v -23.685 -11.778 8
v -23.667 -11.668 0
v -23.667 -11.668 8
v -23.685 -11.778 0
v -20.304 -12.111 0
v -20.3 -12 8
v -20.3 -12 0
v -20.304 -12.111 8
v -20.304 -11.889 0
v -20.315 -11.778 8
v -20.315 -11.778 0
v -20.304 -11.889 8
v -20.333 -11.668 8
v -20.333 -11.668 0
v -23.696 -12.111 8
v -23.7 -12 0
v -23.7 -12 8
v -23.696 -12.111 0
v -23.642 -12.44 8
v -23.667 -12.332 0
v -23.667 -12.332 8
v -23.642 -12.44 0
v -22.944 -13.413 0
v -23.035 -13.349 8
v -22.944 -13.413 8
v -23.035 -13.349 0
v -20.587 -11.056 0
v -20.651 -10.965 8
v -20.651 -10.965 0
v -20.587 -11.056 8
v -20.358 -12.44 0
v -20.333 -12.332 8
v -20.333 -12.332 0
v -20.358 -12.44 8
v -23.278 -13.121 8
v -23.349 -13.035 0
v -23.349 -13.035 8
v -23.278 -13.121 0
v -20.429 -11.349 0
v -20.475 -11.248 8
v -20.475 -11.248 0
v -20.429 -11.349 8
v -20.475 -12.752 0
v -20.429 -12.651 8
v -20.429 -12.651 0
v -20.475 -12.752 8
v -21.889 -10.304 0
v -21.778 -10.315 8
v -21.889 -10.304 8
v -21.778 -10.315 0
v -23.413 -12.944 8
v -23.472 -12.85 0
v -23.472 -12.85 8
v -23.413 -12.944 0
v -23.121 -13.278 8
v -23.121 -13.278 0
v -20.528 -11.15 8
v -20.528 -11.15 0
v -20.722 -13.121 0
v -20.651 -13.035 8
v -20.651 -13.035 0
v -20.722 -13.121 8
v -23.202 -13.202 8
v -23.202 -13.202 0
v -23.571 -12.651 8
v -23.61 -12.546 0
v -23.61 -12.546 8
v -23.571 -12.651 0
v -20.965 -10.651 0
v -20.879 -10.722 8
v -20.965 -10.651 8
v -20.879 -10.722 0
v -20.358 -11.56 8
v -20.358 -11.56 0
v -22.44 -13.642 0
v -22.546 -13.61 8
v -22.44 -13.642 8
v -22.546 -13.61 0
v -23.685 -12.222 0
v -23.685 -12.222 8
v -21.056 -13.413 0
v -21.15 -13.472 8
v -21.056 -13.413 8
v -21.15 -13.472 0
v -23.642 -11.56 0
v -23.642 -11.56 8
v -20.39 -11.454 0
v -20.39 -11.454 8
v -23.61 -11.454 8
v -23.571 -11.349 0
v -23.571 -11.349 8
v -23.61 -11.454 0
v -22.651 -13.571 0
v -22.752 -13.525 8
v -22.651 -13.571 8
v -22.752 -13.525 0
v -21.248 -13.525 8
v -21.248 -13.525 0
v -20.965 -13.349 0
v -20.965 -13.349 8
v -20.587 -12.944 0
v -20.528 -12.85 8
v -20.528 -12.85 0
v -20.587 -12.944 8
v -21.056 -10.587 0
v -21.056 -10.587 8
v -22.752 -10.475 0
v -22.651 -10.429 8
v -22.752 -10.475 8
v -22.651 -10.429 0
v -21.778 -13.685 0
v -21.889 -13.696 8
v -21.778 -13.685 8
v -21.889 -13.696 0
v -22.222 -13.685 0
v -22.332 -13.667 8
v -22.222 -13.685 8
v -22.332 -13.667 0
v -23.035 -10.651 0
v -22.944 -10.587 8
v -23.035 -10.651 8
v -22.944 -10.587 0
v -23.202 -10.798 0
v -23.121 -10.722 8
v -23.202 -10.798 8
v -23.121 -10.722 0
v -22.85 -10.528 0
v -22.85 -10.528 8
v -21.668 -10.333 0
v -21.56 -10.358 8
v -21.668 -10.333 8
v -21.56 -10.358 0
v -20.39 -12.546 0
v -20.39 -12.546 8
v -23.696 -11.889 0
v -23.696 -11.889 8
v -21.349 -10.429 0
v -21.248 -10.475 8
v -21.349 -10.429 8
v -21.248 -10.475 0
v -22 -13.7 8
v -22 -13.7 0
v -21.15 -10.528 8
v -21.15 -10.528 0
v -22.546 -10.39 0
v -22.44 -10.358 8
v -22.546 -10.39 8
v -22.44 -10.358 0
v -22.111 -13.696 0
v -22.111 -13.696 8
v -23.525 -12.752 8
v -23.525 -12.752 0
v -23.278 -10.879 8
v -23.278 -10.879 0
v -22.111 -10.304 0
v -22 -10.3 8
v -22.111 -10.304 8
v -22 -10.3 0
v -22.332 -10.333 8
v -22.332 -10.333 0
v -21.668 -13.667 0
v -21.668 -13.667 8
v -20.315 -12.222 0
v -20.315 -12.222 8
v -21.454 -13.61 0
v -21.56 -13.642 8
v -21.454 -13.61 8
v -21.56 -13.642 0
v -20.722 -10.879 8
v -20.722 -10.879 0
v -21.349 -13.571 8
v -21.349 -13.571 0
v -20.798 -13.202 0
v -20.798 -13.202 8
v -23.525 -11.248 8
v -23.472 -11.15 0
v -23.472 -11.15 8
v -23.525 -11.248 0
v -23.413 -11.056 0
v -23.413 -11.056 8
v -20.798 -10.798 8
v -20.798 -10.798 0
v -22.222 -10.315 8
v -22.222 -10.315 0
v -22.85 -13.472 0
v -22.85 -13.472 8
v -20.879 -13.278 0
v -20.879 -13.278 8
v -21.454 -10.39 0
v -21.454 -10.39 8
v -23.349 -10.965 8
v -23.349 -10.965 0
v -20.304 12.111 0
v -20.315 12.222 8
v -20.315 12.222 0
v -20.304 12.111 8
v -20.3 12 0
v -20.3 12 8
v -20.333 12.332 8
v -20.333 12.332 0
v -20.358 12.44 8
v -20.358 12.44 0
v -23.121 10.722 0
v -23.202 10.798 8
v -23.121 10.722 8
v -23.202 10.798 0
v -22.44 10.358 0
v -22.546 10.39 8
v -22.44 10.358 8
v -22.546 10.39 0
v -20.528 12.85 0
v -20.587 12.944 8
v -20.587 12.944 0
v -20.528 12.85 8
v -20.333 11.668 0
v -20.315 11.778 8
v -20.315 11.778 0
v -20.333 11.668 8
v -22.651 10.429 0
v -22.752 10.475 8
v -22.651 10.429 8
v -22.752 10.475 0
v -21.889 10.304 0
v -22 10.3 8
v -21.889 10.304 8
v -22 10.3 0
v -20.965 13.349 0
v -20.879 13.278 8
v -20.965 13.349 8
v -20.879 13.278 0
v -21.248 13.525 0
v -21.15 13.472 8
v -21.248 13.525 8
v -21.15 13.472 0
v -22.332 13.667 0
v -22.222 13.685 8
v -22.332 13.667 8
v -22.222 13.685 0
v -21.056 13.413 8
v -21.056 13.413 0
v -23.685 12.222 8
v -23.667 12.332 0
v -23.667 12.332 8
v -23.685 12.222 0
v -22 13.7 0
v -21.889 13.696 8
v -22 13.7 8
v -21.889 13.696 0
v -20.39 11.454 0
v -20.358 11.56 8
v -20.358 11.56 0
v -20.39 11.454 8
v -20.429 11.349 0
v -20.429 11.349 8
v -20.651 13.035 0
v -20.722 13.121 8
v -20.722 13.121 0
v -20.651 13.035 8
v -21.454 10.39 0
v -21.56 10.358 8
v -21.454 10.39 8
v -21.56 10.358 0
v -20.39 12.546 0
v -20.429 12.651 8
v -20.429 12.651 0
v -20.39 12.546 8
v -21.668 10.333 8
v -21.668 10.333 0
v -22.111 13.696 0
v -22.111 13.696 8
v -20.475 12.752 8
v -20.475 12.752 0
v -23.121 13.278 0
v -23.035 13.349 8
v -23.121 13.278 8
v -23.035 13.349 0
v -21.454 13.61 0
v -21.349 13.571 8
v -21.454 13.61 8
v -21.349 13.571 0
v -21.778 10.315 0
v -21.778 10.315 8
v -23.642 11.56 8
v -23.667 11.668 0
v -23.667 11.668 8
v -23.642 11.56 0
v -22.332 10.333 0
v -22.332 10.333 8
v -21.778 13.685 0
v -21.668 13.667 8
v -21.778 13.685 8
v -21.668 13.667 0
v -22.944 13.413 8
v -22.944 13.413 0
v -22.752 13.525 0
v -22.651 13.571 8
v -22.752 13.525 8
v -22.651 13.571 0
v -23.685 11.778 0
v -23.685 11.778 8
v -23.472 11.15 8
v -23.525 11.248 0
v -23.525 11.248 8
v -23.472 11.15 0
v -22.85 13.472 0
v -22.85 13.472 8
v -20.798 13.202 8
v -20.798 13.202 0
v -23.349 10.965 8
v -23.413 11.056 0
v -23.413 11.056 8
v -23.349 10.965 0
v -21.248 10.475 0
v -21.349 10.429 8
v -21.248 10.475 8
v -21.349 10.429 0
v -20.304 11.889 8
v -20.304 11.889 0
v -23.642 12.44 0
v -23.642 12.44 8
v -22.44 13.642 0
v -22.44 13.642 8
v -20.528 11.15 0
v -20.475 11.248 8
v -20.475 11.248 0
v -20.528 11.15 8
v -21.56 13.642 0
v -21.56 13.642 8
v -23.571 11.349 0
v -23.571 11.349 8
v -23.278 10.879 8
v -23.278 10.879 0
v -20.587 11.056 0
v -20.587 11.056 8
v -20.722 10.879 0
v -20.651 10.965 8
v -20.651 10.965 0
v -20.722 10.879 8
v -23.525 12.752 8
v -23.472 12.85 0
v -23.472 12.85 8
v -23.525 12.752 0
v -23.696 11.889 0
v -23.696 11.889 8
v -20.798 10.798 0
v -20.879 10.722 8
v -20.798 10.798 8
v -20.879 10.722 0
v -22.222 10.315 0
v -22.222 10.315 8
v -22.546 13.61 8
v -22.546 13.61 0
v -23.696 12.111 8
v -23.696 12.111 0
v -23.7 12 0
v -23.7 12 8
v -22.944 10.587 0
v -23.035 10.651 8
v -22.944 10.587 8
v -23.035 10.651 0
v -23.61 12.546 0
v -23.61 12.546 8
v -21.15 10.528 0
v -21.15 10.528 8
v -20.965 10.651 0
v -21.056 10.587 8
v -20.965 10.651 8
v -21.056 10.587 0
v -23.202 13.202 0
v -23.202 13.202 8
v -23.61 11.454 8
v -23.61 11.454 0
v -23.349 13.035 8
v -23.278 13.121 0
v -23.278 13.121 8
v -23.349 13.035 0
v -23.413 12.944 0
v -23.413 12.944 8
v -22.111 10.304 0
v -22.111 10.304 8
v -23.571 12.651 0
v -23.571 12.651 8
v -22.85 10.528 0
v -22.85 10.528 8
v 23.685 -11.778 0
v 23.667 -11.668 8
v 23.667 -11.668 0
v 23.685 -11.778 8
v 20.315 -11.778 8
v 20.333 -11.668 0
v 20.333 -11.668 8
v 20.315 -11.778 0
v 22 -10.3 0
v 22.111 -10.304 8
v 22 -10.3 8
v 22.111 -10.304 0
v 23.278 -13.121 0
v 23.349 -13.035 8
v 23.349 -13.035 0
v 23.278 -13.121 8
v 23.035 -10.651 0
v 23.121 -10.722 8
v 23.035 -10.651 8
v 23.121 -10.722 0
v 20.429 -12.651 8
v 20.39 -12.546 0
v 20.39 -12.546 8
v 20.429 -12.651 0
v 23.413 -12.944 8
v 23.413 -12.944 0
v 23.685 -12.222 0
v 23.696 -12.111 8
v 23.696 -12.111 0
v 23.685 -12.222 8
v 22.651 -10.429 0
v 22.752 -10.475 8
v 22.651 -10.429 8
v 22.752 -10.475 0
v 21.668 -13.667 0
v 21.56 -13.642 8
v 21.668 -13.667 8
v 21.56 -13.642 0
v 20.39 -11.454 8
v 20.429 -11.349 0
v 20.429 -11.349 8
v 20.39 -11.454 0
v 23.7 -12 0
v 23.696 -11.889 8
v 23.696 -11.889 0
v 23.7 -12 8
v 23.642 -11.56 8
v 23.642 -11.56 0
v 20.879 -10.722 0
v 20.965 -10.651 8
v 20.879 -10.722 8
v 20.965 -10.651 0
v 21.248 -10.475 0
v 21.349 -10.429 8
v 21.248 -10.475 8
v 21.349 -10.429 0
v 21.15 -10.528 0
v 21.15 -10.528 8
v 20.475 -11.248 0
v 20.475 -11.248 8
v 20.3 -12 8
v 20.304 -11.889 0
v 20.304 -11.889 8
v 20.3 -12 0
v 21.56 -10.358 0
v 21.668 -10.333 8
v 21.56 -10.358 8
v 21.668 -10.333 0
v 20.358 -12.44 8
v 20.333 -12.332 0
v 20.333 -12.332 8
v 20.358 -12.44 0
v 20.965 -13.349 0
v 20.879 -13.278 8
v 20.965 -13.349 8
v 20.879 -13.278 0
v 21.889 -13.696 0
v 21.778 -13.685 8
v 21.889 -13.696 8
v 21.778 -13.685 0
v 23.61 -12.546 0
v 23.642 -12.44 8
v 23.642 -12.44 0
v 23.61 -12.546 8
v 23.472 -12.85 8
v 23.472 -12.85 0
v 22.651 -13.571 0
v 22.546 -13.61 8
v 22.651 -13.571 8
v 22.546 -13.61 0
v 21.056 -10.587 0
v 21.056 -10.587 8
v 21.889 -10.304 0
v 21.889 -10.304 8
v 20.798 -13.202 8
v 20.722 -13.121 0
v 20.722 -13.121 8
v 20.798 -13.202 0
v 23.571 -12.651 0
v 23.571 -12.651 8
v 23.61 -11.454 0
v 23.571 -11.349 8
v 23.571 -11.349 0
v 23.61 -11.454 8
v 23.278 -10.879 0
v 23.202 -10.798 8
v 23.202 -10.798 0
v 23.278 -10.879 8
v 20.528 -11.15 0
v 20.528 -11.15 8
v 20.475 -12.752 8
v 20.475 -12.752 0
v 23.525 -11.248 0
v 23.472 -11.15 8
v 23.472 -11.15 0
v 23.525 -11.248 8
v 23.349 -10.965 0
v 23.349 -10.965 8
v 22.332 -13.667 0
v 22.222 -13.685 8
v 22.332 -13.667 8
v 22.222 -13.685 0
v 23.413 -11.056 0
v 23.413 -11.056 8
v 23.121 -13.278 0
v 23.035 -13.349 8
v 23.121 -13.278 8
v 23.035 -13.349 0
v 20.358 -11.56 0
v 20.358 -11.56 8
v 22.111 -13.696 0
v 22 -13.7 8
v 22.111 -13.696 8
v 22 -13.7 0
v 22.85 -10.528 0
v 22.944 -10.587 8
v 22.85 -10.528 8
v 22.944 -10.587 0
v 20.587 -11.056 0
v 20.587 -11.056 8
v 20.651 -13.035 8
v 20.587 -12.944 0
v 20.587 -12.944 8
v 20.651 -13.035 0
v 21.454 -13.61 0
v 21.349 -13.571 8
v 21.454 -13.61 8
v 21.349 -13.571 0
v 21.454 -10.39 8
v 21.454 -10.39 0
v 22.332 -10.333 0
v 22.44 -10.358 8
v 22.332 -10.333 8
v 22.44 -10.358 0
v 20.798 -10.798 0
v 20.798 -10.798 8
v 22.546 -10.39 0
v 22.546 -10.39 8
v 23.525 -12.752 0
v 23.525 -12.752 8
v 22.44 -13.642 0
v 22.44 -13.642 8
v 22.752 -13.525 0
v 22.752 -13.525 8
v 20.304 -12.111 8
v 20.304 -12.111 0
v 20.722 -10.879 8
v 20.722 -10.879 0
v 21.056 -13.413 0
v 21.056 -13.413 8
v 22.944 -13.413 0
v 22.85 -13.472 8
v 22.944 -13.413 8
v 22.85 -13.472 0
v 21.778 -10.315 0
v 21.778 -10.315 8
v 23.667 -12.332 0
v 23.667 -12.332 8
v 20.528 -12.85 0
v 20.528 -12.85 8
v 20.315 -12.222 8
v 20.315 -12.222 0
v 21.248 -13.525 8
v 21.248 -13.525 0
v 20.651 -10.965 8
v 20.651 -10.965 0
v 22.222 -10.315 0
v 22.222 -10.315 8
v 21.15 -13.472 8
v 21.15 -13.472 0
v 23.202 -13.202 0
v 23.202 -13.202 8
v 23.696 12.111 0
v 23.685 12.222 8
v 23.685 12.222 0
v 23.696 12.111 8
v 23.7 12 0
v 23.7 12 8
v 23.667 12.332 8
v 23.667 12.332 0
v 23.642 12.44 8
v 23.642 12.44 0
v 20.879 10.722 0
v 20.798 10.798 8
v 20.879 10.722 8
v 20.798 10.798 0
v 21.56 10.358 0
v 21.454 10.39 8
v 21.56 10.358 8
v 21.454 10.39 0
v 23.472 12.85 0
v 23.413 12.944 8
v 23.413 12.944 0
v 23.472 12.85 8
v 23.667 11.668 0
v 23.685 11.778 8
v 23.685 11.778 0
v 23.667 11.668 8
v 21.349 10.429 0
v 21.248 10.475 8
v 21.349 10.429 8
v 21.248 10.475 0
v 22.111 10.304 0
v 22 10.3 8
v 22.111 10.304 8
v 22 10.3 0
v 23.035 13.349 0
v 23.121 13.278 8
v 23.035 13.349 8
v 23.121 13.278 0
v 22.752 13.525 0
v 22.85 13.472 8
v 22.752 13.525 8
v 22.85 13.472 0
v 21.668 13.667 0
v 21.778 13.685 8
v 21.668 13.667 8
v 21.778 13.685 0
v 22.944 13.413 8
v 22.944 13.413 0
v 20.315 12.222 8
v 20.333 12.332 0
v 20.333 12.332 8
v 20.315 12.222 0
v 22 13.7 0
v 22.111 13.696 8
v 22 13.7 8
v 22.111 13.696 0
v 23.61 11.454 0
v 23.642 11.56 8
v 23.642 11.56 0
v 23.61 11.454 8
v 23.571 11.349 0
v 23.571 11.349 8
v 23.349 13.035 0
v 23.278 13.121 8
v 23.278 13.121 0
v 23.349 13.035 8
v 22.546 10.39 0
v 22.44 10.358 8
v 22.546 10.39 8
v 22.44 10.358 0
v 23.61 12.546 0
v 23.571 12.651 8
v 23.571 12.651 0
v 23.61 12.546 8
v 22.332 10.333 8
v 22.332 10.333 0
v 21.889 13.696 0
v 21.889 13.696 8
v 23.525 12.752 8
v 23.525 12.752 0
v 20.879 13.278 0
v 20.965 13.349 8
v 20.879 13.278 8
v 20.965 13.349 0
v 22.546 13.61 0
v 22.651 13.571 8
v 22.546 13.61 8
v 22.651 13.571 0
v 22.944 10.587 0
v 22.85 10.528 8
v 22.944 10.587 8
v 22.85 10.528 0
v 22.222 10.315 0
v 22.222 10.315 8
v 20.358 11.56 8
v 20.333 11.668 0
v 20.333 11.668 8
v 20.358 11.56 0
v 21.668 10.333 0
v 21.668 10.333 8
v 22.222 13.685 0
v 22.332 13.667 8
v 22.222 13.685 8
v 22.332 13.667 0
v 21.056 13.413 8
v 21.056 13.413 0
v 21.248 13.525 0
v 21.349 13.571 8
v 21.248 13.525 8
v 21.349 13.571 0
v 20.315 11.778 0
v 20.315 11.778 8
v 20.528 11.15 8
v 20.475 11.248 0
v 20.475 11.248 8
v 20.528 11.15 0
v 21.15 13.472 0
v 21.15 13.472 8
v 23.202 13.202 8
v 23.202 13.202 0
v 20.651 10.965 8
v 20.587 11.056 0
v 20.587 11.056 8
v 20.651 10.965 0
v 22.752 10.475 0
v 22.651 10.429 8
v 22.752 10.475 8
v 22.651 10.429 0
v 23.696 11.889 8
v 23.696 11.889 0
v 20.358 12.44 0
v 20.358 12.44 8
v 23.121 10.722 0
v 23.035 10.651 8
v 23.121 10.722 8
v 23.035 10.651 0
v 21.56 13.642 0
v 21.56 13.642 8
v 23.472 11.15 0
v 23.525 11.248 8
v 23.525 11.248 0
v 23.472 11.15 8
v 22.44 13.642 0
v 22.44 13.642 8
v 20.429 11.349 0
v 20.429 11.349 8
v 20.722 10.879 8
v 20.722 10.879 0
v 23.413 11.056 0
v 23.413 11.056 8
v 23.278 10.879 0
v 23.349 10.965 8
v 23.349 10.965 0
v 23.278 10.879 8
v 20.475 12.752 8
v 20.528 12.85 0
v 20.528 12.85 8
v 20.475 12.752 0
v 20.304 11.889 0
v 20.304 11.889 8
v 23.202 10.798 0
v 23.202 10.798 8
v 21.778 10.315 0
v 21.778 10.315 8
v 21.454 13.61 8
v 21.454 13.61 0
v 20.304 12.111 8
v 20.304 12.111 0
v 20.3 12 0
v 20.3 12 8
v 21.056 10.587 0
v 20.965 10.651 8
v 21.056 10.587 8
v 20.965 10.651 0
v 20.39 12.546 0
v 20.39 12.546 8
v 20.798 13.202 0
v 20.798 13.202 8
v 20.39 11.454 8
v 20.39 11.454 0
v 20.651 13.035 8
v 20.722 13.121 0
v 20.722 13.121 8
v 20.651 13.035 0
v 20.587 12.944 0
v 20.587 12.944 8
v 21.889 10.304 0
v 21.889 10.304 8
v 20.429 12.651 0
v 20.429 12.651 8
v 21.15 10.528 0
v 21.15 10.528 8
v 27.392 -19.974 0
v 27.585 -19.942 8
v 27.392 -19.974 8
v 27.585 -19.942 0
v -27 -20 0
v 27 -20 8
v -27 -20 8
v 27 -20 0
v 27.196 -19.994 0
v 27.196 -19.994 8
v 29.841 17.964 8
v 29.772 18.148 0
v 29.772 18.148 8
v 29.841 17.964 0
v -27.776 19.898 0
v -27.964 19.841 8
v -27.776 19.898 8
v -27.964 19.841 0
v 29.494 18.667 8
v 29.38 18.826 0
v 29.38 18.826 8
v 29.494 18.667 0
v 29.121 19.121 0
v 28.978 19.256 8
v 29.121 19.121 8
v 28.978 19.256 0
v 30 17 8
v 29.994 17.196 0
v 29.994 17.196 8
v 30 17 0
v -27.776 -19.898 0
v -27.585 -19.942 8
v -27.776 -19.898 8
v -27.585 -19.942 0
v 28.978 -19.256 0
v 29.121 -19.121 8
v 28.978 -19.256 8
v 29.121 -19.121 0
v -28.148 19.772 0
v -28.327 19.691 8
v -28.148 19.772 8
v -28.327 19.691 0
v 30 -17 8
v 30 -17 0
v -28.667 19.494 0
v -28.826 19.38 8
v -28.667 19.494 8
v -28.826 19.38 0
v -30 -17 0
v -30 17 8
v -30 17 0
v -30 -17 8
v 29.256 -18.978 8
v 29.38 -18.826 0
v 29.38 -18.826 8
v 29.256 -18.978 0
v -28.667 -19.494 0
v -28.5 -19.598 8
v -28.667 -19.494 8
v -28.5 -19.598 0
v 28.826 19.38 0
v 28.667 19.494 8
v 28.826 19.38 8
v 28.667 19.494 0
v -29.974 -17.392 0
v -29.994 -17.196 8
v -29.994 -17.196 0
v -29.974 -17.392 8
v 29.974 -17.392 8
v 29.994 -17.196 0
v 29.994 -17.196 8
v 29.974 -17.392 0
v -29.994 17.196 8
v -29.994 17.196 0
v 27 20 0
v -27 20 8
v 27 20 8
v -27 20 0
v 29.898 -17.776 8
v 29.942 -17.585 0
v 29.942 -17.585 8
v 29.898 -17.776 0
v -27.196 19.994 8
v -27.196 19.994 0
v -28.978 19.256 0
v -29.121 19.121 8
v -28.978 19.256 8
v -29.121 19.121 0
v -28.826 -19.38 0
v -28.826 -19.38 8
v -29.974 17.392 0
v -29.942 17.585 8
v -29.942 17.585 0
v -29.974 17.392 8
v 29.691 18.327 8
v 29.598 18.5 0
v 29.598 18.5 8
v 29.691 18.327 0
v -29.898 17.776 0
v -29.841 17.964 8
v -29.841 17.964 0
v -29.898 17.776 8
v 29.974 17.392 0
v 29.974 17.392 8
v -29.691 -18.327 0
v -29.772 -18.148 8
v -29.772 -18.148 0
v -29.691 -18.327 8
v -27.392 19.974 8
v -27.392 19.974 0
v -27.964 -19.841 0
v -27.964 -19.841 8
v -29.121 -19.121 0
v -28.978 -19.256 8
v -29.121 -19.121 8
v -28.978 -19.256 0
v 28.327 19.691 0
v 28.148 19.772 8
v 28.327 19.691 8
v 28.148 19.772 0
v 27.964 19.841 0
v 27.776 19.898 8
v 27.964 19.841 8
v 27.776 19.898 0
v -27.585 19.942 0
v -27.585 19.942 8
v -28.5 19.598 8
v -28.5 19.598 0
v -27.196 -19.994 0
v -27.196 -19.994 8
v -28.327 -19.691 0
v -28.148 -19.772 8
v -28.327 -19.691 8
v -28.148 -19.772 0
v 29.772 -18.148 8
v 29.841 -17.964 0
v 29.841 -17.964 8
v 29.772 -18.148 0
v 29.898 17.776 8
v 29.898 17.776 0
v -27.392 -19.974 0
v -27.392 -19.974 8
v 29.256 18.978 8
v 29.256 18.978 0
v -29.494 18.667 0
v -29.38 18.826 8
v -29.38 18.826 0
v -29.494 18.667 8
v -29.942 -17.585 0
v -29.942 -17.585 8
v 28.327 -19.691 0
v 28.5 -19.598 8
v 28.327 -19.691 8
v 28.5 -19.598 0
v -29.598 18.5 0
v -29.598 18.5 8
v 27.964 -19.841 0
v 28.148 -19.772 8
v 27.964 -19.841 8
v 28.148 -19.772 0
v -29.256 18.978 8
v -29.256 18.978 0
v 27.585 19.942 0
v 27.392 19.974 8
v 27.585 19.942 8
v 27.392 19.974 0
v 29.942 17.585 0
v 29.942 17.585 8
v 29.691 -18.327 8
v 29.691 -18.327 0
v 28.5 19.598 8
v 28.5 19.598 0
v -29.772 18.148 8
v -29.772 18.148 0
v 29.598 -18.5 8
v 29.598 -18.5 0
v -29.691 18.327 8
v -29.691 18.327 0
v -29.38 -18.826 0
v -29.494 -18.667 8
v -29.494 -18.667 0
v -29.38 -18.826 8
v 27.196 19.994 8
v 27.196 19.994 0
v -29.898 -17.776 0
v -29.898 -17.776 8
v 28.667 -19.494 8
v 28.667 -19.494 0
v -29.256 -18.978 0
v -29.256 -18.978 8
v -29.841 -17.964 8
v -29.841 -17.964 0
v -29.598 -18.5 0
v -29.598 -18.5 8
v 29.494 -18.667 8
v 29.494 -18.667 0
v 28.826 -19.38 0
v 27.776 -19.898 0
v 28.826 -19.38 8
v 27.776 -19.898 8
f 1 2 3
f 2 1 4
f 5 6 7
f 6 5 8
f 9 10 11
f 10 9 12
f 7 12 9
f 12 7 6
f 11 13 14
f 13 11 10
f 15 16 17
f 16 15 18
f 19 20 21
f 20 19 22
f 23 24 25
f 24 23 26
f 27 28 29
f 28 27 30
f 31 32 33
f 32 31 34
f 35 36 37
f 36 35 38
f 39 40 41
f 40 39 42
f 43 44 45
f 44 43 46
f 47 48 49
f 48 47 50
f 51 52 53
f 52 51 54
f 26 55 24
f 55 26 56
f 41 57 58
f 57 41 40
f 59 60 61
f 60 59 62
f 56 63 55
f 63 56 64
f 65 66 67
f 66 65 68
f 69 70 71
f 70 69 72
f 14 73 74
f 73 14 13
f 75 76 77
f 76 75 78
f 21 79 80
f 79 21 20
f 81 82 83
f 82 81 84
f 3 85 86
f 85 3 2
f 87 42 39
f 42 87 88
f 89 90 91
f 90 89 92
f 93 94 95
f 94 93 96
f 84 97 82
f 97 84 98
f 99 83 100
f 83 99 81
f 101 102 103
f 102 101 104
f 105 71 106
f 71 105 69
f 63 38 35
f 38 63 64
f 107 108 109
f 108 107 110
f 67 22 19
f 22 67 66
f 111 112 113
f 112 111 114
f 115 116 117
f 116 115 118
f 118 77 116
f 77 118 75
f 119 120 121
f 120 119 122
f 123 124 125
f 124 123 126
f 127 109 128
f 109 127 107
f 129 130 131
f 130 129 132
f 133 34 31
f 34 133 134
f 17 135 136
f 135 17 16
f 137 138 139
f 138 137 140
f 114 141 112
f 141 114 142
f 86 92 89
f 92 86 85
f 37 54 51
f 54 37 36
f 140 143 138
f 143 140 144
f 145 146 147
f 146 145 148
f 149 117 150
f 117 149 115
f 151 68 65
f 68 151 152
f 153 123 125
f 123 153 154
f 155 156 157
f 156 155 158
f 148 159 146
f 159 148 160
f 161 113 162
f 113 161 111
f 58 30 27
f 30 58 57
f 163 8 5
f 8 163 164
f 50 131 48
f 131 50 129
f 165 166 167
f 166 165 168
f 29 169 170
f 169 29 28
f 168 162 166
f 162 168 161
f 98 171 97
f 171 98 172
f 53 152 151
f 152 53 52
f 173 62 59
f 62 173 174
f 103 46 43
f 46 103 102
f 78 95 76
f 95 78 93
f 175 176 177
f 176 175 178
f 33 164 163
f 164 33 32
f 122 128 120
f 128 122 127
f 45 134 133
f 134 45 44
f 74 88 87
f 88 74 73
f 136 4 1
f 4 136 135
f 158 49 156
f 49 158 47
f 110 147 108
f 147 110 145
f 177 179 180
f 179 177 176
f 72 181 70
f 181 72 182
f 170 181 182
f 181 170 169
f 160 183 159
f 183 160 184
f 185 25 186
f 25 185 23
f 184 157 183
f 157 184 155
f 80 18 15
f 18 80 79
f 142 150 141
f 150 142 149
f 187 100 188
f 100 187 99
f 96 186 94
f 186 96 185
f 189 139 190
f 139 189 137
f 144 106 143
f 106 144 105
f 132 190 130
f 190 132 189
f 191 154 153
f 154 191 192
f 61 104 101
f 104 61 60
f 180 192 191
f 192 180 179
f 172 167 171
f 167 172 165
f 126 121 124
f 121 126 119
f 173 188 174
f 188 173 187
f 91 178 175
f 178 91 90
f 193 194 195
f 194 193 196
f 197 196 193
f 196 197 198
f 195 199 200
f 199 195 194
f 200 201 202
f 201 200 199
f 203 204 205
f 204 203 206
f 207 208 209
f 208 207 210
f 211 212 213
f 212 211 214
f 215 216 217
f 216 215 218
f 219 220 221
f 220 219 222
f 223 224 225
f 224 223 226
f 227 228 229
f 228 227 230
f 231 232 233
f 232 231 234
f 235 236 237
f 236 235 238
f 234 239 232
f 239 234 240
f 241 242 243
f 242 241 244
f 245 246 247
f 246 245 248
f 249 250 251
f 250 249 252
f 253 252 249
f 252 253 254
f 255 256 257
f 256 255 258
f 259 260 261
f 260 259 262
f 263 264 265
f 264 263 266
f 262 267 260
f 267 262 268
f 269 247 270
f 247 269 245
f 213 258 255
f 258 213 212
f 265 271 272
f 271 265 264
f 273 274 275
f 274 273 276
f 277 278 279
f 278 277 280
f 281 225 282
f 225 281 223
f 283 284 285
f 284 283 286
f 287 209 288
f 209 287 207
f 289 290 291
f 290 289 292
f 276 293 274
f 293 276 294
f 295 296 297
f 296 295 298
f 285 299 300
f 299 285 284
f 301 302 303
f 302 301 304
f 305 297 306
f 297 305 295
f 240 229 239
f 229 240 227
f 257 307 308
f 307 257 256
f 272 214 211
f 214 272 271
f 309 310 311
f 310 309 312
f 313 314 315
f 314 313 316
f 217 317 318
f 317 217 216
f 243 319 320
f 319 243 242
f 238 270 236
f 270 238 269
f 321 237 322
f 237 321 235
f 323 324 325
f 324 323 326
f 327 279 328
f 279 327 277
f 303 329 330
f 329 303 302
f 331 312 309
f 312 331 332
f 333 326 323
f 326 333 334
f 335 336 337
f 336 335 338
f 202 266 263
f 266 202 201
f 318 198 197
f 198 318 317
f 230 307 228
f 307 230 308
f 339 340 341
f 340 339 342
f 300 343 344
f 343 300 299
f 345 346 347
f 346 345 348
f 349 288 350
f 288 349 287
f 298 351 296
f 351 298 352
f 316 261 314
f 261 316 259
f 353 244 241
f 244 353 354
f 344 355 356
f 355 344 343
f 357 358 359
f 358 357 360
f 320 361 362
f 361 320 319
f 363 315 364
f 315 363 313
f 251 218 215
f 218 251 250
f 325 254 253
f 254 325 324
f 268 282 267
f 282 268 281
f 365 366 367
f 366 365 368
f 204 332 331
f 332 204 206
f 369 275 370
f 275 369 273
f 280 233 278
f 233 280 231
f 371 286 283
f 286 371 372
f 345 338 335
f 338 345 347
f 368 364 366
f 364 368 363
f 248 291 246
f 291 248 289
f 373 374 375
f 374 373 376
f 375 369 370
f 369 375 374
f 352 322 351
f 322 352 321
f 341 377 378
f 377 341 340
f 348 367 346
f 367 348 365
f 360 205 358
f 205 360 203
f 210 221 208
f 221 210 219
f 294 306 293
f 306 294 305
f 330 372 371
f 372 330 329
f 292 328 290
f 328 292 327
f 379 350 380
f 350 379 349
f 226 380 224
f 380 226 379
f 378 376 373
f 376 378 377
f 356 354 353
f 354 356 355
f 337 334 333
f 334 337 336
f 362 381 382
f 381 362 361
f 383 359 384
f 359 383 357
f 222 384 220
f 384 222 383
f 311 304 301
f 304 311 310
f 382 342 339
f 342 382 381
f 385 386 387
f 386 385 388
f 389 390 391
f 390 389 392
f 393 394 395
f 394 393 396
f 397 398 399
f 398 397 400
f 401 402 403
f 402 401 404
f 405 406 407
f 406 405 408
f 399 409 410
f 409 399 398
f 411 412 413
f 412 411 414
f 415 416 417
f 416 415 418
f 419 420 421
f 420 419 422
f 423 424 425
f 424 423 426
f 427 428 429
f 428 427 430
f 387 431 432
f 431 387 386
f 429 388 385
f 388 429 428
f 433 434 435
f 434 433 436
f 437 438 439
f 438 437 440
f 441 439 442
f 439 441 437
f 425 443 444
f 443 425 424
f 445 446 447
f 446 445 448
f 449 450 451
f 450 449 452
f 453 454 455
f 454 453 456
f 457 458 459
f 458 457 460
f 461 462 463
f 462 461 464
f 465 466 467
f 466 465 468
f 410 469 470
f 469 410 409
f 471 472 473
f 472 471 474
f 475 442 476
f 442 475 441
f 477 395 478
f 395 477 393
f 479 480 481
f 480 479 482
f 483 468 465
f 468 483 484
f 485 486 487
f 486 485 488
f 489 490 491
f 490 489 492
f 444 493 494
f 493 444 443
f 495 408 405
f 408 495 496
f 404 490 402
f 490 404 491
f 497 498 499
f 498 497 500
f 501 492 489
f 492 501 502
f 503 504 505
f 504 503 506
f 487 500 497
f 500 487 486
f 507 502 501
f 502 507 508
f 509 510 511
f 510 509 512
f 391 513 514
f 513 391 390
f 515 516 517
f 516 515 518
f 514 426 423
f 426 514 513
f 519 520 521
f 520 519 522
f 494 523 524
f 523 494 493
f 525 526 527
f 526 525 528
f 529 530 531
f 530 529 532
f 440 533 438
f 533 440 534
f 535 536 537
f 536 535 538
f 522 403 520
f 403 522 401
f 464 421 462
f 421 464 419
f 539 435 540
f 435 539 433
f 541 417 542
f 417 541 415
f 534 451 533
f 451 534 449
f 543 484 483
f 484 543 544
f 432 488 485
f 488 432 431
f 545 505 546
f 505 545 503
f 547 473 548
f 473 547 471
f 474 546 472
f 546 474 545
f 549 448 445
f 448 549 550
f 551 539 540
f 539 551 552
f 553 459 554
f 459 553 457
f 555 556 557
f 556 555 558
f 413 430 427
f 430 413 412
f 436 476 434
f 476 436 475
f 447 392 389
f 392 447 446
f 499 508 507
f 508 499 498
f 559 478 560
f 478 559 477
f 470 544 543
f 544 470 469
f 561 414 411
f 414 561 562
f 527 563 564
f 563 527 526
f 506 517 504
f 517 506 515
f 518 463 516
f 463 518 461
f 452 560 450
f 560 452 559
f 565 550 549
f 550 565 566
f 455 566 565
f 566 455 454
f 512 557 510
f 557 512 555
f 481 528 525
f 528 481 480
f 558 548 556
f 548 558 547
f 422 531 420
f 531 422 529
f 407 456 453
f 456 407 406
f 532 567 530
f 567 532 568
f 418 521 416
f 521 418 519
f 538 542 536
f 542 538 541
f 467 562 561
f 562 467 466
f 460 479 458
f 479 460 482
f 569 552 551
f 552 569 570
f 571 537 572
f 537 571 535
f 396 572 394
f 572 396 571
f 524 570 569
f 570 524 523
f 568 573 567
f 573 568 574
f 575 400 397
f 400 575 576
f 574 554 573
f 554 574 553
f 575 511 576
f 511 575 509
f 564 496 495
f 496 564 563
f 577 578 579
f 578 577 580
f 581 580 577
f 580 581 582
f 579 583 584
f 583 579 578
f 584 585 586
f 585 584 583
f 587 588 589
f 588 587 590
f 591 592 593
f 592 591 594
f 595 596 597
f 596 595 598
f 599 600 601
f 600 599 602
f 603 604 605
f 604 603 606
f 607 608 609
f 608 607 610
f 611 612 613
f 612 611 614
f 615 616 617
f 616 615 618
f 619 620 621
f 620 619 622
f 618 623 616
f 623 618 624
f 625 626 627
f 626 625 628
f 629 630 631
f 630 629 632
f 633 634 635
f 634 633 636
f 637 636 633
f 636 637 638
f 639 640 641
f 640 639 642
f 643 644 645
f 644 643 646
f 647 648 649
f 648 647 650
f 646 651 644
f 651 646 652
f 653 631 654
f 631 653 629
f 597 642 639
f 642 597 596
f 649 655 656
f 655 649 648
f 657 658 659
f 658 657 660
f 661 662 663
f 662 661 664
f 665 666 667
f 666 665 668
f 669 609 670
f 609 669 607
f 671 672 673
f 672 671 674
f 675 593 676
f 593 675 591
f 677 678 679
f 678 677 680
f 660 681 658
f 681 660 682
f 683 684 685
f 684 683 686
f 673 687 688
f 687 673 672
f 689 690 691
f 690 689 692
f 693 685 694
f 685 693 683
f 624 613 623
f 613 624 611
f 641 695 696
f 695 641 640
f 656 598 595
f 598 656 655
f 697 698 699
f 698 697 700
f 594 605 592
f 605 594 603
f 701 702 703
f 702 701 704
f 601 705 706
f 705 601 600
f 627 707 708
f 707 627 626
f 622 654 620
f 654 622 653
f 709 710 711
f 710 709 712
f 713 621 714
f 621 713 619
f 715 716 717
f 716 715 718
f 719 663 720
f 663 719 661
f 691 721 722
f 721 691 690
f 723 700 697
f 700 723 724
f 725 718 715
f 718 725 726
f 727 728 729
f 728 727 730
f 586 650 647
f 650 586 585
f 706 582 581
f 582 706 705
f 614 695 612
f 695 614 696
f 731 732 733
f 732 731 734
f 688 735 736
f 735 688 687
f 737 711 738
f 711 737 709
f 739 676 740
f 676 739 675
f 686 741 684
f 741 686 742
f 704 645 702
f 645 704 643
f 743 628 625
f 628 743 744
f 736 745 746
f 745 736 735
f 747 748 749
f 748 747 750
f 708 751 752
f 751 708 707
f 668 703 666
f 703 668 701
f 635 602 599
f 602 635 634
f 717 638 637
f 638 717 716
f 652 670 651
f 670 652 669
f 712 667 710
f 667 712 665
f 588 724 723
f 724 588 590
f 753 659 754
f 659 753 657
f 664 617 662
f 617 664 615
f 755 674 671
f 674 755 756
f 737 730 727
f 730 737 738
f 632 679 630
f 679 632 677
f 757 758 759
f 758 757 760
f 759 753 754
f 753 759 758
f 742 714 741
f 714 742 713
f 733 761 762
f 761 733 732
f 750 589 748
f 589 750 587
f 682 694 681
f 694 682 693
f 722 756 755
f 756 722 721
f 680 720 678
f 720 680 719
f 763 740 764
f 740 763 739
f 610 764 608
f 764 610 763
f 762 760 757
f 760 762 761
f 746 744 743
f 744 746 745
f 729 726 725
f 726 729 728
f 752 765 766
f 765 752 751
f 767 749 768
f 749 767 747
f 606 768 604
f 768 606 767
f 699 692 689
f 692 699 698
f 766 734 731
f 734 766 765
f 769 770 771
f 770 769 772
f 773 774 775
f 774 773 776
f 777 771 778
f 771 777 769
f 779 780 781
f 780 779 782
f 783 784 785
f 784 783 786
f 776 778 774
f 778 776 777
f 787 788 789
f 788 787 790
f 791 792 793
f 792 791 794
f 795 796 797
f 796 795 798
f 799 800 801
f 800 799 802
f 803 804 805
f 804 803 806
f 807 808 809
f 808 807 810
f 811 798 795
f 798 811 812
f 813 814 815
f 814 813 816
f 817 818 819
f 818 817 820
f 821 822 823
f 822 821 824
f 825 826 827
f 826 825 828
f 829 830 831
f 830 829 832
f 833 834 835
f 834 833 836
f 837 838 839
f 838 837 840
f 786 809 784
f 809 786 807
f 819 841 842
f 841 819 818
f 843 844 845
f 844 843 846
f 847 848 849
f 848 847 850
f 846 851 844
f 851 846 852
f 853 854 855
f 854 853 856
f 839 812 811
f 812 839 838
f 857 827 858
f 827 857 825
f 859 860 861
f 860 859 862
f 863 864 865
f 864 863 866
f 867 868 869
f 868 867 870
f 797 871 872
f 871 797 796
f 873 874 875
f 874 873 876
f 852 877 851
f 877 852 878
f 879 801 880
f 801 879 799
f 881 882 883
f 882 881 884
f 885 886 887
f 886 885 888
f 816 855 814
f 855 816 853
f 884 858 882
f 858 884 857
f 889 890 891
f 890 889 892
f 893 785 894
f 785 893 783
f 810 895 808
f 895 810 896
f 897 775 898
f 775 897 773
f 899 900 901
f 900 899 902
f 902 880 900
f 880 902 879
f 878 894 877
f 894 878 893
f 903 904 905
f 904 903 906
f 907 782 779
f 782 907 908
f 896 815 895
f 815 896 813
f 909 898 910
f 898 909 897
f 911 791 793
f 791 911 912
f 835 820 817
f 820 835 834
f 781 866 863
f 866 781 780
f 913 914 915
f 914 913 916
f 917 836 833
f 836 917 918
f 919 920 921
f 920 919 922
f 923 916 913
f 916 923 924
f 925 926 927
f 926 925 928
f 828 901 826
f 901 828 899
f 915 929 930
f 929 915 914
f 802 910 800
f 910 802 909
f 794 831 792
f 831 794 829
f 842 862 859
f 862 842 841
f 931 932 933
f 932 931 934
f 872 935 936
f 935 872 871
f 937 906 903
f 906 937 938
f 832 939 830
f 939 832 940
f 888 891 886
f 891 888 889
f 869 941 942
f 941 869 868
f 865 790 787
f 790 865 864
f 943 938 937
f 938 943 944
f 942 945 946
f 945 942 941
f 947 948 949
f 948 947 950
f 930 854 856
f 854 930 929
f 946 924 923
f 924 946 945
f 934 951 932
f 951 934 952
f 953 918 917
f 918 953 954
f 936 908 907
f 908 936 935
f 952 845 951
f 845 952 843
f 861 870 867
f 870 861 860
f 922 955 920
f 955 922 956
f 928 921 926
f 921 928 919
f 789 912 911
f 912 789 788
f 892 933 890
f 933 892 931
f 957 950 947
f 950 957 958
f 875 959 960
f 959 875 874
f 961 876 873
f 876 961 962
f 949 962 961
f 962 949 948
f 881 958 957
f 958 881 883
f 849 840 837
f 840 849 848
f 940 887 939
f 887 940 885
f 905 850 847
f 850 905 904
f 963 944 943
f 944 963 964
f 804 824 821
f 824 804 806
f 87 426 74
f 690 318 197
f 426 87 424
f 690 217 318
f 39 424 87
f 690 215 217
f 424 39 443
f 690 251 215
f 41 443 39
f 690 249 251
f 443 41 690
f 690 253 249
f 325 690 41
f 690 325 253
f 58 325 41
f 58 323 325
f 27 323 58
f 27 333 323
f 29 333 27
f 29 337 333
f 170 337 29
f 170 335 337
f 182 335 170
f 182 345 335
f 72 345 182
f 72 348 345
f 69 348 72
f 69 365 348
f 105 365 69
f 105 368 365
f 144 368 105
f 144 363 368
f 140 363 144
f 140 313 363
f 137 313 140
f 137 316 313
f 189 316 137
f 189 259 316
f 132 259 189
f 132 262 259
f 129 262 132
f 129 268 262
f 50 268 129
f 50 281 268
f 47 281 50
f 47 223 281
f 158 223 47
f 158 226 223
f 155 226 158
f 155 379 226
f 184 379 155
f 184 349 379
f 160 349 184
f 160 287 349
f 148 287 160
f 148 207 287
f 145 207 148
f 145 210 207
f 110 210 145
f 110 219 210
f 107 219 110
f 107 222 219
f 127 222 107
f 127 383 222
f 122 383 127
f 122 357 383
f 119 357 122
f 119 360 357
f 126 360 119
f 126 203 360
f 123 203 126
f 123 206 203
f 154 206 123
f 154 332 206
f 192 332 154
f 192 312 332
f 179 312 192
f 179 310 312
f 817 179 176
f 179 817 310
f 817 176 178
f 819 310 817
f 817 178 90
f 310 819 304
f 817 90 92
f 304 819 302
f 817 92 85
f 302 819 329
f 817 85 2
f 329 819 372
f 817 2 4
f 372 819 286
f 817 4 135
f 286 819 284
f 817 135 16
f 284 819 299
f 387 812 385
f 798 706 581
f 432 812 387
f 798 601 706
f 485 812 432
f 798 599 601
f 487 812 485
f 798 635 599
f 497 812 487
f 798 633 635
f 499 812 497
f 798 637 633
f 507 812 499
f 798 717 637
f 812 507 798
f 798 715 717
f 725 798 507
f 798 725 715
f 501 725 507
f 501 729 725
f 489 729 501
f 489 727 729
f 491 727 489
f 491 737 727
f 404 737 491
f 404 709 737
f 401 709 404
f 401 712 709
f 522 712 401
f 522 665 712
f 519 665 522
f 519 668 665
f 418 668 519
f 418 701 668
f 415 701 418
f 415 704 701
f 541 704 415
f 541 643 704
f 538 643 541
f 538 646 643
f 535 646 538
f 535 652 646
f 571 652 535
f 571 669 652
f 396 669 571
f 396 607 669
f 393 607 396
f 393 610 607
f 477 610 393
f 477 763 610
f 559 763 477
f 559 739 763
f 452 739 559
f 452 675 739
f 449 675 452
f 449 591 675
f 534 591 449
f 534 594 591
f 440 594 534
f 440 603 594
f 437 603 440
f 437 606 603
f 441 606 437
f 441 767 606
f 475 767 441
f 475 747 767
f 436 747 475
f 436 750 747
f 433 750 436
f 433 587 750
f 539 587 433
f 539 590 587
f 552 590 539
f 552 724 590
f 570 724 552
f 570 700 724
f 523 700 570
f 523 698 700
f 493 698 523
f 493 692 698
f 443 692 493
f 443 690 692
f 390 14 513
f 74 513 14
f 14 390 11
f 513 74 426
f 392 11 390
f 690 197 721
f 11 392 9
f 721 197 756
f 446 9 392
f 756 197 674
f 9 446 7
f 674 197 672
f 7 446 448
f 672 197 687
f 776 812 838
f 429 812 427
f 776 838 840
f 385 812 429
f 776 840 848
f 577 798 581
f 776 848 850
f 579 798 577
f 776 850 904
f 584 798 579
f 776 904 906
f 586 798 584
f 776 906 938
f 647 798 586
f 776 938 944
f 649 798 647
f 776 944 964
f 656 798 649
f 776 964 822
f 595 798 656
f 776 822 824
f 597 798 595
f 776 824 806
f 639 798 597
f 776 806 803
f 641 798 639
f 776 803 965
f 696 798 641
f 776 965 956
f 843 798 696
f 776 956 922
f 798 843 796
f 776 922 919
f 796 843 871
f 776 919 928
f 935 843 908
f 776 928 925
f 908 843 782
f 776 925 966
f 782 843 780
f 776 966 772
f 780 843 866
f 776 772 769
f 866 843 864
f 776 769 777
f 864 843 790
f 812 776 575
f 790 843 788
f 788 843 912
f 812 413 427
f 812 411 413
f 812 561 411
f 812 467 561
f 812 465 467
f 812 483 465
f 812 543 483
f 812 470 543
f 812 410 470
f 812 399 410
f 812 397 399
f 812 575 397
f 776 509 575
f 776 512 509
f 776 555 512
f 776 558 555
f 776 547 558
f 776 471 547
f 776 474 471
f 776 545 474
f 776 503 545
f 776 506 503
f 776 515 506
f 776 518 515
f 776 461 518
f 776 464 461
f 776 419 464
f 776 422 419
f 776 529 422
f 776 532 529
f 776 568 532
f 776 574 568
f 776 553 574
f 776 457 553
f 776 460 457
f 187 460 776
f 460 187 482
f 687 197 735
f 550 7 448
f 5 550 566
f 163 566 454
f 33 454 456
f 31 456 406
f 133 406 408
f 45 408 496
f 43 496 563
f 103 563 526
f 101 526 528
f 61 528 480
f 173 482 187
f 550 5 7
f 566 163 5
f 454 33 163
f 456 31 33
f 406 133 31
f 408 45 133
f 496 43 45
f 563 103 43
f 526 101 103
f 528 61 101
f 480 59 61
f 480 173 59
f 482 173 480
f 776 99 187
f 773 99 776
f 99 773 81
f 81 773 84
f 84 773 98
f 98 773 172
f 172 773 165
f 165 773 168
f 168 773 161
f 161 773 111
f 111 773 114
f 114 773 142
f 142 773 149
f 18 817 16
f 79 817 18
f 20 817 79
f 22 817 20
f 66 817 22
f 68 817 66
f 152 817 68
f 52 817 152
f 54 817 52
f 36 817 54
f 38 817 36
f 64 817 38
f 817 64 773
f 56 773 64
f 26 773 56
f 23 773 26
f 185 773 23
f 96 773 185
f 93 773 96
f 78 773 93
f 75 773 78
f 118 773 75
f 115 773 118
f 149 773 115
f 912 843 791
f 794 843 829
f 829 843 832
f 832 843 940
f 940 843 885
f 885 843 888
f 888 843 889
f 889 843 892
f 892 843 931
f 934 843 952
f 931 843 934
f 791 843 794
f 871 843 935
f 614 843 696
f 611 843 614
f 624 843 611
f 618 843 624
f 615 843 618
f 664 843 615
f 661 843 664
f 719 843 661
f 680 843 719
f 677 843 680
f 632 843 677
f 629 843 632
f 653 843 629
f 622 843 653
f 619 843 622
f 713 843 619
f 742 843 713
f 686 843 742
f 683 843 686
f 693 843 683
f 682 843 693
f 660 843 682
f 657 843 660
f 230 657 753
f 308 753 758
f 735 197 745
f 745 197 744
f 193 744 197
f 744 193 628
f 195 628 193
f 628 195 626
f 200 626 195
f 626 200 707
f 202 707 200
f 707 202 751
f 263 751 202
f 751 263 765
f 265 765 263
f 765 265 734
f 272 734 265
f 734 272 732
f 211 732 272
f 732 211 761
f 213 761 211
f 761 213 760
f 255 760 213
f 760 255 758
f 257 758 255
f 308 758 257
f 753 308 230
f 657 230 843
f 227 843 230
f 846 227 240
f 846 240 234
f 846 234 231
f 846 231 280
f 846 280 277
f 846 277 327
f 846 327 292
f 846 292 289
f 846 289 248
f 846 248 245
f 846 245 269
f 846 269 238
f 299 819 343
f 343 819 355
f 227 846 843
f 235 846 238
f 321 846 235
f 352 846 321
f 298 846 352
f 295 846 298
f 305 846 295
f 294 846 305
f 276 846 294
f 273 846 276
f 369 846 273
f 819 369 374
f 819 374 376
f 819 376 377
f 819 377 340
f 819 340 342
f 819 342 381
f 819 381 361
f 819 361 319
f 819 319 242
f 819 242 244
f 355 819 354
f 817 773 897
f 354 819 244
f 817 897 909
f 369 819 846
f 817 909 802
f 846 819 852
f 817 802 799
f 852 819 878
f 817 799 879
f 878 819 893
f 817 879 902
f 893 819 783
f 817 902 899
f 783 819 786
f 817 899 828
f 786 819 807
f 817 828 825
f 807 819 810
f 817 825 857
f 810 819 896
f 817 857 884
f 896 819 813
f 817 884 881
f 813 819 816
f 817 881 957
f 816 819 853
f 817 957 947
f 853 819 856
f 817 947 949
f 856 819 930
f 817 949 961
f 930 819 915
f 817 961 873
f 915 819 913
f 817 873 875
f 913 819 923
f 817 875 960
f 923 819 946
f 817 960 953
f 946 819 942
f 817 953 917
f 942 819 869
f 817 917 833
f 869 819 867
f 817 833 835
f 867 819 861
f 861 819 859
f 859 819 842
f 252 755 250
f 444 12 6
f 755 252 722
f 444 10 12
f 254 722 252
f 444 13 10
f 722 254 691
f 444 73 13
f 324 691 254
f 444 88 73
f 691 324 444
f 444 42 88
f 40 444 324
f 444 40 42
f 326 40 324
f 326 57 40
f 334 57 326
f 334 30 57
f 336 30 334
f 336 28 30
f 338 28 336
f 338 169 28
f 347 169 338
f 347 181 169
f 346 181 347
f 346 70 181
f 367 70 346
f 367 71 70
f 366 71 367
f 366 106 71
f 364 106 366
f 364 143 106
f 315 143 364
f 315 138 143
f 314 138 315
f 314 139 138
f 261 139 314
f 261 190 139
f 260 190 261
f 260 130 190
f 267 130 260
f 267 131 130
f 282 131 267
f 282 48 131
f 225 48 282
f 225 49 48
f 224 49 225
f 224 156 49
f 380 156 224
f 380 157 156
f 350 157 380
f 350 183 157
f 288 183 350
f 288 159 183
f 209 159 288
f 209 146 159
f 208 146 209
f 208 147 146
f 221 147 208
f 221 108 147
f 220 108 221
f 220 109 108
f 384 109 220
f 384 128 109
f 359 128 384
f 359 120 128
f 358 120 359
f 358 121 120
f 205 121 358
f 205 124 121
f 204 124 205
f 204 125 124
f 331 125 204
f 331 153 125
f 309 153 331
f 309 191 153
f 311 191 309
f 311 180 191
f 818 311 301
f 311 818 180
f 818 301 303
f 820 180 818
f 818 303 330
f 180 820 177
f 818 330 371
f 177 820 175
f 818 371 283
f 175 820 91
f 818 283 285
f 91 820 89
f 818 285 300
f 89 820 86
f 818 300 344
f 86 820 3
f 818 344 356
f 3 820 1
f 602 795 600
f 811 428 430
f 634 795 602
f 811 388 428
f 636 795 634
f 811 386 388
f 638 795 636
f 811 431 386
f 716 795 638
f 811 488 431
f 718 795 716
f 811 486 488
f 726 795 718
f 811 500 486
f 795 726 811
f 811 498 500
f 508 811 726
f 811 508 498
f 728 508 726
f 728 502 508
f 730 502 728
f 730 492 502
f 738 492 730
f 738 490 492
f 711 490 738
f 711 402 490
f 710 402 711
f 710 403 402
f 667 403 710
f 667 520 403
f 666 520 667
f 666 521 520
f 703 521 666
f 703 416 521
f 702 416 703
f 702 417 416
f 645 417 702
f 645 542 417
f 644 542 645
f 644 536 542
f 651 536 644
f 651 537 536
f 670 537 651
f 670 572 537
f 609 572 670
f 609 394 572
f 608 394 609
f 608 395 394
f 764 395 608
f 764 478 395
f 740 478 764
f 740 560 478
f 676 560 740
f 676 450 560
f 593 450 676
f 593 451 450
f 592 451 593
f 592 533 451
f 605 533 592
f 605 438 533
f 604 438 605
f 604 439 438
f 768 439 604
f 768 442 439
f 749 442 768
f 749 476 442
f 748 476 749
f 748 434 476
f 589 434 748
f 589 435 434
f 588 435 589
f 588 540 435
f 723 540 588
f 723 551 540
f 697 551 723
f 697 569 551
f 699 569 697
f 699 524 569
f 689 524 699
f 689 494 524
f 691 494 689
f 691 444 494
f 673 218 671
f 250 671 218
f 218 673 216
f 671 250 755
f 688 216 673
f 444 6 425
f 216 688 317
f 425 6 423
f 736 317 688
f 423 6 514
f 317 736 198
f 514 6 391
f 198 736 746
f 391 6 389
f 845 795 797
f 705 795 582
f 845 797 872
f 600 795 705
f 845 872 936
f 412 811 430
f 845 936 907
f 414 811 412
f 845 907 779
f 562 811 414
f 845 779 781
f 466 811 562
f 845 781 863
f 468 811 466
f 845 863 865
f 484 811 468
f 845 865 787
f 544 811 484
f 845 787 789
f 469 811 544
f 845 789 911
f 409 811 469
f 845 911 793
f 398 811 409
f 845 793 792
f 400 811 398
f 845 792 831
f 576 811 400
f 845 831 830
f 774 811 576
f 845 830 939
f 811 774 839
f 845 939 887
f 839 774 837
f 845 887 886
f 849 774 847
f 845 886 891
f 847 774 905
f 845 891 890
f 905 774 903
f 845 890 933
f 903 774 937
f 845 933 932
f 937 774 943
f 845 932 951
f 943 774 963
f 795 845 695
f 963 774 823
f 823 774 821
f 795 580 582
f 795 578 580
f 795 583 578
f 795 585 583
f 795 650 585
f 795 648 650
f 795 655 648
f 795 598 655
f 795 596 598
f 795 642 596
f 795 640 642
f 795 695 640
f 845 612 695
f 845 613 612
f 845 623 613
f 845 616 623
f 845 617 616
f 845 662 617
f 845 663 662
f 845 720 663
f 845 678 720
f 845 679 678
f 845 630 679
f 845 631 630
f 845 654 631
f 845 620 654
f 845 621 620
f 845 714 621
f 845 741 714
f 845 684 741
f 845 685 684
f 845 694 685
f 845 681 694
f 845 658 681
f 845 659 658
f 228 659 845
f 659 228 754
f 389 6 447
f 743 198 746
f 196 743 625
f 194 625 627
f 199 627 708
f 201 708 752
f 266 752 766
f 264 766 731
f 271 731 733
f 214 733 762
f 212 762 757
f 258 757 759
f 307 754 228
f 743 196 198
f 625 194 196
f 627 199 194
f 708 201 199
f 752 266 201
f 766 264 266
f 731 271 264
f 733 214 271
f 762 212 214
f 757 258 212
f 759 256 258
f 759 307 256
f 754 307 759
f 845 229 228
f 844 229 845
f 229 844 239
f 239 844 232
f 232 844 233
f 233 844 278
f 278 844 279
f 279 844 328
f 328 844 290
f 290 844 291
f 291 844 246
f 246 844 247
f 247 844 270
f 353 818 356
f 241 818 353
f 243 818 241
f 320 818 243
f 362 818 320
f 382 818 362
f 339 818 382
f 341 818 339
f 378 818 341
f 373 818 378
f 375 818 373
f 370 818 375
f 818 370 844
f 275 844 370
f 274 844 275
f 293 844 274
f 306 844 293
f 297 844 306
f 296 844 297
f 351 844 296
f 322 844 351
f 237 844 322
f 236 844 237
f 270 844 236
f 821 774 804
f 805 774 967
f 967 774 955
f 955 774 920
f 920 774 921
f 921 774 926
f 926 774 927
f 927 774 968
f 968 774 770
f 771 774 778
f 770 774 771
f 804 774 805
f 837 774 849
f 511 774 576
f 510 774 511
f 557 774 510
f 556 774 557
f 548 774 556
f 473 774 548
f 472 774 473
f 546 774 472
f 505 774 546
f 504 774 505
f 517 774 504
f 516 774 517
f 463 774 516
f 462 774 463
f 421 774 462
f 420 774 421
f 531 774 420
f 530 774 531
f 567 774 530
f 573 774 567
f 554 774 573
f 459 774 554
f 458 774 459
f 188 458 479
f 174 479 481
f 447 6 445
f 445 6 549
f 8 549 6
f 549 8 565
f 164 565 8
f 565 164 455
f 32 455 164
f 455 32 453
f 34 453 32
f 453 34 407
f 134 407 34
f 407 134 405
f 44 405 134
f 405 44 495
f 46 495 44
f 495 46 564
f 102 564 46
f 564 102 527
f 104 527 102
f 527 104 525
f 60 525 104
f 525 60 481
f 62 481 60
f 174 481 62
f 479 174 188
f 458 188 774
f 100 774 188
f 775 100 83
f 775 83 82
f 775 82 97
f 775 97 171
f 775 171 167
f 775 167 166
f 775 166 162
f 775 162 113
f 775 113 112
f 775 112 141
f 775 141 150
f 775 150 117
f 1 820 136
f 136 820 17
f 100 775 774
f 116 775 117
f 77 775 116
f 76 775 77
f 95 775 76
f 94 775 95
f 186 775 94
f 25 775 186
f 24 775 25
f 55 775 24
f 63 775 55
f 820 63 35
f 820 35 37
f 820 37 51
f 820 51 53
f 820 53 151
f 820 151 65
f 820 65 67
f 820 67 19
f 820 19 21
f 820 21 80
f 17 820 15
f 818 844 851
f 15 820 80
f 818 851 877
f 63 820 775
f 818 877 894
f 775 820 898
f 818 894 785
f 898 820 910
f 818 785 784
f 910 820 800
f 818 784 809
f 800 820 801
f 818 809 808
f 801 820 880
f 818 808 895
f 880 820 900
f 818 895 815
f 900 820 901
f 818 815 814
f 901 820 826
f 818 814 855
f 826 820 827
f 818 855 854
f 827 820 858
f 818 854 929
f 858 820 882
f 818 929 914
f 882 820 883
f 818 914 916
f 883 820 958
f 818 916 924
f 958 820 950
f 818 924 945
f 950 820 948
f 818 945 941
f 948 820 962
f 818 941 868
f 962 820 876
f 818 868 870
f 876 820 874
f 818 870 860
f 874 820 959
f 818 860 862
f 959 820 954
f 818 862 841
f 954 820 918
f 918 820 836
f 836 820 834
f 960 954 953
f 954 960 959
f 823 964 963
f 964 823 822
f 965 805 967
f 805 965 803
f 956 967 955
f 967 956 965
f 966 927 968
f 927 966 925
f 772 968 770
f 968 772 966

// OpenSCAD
// Parametric OpenSCAD starter for dimensioned FDM parts.
// Units: millimetres

/* [Primary dimensions] */
part_x = 60;
part_y = 40;
part_z = 8;
corner_r = 3;

/* [Functional features] */
hole_d = 3.4;
hole_edge_x = 8;
hole_edge_y = 8;

/* [Quality] */
preview_fn = 32;
render_fn = 96;
$fn = $preview ? preview_fn : render_fn;
eps = 0.01;

assert(part_x > 2 * corner_r, "part_x is too small for corner_r");
assert(part_y > 2 * corner_r, "part_y is too small for corner_r");
assert(hole_edge_x > hole_d / 2, "hole is too close to X edge");
assert(hole_edge_y > hole_d / 2, "hole is too close to Y edge");

module rounded_profile(size = [part_x, part_y], r = corner_r) {
    offset(r = r)
        square([size.x - 2 * r, size.y - 2 * r], center = true);
}

module primary_body() {
    linear_extrude(height = part_z)
        rounded_profile();
}

module additive_features() {
    // Add bosses, ribs, or locating features here.
}

module subtractive_features() {
    for (x = [-part_x / 2 + hole_edge_x, part_x / 2 - hole_edge_x])
        for (y = [-part_y / 2 + hole_edge_y, part_y / 2 - hole_edge_y])
            translate([x, y, -eps])
                cylinder(d = hole_d, h = part_z + 2 * eps);
}

difference() {
    union() {
        primary_body();
        additive_features();
    }
    subtractive_features();
}
